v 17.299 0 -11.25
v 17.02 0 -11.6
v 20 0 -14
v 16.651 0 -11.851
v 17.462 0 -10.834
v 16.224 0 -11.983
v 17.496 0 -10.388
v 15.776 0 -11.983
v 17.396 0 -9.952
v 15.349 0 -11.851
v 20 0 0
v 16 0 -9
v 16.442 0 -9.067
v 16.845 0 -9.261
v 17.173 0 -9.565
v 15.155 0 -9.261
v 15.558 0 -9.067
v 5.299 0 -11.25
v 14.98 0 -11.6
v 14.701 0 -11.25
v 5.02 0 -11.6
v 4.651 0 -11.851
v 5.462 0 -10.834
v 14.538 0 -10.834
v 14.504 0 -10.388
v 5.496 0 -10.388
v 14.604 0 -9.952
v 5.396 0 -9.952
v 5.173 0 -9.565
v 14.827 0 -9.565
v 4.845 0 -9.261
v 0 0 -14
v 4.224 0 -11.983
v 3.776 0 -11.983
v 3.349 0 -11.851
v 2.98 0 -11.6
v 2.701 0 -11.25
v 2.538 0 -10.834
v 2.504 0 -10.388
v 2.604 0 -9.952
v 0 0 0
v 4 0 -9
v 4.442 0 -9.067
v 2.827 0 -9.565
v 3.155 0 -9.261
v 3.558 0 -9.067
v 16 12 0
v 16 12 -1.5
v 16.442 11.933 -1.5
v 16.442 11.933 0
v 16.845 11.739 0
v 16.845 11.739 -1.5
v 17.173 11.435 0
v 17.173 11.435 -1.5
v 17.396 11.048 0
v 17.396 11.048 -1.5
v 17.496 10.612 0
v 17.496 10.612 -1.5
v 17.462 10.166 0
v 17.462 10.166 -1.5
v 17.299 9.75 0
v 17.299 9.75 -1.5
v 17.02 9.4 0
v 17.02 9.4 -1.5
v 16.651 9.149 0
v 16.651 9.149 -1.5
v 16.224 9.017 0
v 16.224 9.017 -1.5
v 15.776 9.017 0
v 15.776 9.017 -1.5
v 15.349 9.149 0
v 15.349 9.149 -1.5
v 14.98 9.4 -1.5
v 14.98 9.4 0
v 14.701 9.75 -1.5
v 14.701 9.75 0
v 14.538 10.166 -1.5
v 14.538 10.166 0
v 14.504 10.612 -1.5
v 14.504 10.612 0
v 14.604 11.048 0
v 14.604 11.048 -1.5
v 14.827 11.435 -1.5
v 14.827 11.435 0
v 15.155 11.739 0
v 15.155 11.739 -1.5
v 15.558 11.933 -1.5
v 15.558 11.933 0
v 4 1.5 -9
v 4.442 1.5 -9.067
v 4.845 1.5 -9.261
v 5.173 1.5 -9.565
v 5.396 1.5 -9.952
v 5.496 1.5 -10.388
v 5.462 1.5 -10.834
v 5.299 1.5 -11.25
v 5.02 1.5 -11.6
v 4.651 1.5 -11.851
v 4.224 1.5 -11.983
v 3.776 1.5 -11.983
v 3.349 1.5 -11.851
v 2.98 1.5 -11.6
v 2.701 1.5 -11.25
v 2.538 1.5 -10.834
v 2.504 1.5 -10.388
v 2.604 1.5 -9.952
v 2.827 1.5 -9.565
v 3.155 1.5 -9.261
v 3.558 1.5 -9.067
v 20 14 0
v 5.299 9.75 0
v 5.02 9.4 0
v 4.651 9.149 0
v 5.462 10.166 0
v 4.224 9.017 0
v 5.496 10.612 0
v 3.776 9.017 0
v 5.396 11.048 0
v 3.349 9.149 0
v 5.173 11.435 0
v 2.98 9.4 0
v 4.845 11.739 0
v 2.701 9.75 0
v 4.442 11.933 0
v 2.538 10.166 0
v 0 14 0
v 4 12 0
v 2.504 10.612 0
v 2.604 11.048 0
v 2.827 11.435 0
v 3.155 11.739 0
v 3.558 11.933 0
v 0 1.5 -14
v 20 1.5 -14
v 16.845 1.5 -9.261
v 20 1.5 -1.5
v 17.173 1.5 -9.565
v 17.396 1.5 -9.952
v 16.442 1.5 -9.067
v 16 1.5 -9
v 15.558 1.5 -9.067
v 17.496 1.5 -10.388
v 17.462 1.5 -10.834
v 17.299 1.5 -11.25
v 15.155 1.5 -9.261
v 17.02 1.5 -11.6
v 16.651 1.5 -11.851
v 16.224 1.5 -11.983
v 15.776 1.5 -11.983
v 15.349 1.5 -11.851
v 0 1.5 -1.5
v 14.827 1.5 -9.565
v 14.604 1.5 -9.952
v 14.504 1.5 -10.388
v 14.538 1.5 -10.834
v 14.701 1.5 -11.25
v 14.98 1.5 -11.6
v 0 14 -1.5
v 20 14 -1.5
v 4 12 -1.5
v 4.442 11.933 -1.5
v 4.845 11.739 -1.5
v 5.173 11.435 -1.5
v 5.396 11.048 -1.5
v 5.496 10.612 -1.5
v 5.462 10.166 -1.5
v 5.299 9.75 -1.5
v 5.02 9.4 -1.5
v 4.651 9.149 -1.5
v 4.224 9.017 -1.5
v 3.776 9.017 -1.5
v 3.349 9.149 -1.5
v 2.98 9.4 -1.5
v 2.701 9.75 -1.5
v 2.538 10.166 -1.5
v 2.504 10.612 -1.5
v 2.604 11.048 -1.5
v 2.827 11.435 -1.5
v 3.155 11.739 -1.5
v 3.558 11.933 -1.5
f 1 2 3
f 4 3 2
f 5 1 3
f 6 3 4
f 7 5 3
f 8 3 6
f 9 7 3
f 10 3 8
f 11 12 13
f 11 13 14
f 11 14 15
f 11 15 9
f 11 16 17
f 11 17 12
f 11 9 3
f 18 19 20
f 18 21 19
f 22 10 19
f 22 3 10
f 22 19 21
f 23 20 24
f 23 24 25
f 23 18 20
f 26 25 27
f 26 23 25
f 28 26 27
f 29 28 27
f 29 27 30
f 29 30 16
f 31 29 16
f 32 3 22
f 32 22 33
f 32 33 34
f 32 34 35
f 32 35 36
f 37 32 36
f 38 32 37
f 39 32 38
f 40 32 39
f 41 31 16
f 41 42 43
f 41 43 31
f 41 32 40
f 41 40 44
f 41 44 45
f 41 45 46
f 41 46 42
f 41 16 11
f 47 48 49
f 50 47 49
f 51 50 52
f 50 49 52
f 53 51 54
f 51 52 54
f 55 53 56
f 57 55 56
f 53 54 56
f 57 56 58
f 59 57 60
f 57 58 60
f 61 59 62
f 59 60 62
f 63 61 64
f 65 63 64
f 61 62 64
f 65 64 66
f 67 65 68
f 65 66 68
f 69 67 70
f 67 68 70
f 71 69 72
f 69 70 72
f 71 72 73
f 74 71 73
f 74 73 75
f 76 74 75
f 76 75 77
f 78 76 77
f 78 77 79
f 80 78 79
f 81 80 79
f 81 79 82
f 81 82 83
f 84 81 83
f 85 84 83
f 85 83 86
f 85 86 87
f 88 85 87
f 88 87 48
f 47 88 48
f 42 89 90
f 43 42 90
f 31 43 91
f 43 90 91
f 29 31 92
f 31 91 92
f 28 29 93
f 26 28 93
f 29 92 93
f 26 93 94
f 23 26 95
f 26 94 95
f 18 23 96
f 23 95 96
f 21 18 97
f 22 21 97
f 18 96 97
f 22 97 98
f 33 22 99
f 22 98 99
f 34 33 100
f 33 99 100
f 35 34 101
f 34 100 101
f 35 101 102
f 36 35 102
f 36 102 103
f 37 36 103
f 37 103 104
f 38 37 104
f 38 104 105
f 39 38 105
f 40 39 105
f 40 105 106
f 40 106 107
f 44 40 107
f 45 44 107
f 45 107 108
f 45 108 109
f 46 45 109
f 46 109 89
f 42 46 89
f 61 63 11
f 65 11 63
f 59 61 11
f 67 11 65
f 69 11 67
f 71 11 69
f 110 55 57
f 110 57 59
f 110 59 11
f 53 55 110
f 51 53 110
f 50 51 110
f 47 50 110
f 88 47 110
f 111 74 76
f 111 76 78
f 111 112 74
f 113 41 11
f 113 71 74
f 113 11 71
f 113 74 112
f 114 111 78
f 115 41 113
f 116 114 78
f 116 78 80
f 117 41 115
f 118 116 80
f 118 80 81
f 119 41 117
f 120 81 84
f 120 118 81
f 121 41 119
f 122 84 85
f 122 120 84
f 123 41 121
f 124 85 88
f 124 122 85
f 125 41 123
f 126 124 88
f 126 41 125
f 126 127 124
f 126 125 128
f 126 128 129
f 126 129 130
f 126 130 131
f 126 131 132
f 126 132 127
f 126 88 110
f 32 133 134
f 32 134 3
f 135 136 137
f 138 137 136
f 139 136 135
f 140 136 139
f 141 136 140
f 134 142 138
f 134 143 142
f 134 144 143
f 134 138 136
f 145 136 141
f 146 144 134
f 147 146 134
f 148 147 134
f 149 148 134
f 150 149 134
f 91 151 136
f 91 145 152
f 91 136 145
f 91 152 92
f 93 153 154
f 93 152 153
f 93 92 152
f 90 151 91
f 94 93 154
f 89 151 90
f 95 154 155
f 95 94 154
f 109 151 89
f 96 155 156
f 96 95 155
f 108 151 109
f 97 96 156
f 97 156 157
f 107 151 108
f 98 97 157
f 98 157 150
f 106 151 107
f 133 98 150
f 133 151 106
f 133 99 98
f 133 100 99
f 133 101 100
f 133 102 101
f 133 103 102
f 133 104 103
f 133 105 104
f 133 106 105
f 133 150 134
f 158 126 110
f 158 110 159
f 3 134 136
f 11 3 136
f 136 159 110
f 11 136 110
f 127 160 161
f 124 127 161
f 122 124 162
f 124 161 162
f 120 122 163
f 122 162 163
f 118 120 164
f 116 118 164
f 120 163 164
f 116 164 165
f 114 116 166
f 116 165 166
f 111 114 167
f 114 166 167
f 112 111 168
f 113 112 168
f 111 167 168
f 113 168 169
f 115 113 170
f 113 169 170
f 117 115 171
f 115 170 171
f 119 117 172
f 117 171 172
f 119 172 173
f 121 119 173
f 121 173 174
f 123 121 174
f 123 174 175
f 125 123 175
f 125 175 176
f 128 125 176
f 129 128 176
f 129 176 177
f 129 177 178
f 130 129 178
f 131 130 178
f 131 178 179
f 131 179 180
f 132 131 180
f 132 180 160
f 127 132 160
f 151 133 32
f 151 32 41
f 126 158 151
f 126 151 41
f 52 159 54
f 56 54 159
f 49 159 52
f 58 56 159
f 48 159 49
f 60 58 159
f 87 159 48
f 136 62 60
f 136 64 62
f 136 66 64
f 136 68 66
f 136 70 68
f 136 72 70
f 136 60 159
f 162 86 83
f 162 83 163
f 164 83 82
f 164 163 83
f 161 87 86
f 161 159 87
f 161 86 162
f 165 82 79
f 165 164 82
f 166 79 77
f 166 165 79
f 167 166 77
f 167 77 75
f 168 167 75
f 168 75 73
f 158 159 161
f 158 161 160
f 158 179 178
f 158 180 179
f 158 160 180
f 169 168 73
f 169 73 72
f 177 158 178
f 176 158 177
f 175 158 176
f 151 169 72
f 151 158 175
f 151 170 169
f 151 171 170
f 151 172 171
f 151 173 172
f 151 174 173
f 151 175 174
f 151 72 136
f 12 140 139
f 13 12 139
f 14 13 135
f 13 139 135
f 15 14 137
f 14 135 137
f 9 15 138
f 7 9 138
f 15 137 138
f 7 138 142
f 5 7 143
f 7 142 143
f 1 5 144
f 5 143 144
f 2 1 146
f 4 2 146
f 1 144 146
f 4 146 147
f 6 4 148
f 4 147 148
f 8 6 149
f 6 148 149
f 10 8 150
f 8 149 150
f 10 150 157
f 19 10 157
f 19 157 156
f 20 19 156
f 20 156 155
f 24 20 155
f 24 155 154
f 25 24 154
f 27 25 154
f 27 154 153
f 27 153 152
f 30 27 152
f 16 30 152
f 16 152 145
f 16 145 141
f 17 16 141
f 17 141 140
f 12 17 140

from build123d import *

# Parameters (mm, degrees)
EXTRUDE_1_DEPTH     = 20
SKETCH_2_R          = 1.5
CUT_EXTRUDE_1_DEPTH = 28.427176304
SKETCH_3_R          = 1.5
CUT_EXTRUDE_2_DEPTH = 28.427176304


with BuildPart() as part:
    # 草图1 → 凸台-拉伸1 (new body)
    with BuildSketch(Plane(origin=(0, 0, 0), x_dir=(0, 0, -1), z_dir=(1, 0, 0))):
        Polygon((0, 0), (0, 14), (1.5, 14), (1.5, 1.5), (14, 1.5), (14, 0), align=None)
    extrude(amount=EXTRUDE_1_DEPTH)

    # 草图2 → 切除-拉伸1 (cut, through all)
    with BuildSketch(Plane(origin=(0, 0, -1.5), x_dir=(-1, 0, 0), z_dir=(0, 0, -1))):
        with Locations(Location((-16, 10.5, 0), (0, 0, 90))):
            Circle(SKETCH_2_R)
        with Locations(Location((-4, 10.5, 0), (0, 0, 90))):
            Circle(SKETCH_2_R)
    extrude(amount=-CUT_EXTRUDE_1_DEPTH, mode=Mode.SUBTRACT)

    # 草图3 → 切除-拉伸2 (cut, through all)
    with BuildSketch(Plane(origin=(0, 1.5, 0), x_dir=(1, 0, 0), z_dir=(0, 1, 0))):
        with Locations(Location((4, 10.5, 0), (0, 0, 270))):
            Circle(SKETCH_3_R)
        with Locations(Location((16, 10.5, 0), (0, 0, 270))):
            Circle(SKETCH_3_R)
    extrude(amount=-CUT_EXTRUDE_2_DEPTH, mode=Mode.SUBTRACT)


solid = part.part
